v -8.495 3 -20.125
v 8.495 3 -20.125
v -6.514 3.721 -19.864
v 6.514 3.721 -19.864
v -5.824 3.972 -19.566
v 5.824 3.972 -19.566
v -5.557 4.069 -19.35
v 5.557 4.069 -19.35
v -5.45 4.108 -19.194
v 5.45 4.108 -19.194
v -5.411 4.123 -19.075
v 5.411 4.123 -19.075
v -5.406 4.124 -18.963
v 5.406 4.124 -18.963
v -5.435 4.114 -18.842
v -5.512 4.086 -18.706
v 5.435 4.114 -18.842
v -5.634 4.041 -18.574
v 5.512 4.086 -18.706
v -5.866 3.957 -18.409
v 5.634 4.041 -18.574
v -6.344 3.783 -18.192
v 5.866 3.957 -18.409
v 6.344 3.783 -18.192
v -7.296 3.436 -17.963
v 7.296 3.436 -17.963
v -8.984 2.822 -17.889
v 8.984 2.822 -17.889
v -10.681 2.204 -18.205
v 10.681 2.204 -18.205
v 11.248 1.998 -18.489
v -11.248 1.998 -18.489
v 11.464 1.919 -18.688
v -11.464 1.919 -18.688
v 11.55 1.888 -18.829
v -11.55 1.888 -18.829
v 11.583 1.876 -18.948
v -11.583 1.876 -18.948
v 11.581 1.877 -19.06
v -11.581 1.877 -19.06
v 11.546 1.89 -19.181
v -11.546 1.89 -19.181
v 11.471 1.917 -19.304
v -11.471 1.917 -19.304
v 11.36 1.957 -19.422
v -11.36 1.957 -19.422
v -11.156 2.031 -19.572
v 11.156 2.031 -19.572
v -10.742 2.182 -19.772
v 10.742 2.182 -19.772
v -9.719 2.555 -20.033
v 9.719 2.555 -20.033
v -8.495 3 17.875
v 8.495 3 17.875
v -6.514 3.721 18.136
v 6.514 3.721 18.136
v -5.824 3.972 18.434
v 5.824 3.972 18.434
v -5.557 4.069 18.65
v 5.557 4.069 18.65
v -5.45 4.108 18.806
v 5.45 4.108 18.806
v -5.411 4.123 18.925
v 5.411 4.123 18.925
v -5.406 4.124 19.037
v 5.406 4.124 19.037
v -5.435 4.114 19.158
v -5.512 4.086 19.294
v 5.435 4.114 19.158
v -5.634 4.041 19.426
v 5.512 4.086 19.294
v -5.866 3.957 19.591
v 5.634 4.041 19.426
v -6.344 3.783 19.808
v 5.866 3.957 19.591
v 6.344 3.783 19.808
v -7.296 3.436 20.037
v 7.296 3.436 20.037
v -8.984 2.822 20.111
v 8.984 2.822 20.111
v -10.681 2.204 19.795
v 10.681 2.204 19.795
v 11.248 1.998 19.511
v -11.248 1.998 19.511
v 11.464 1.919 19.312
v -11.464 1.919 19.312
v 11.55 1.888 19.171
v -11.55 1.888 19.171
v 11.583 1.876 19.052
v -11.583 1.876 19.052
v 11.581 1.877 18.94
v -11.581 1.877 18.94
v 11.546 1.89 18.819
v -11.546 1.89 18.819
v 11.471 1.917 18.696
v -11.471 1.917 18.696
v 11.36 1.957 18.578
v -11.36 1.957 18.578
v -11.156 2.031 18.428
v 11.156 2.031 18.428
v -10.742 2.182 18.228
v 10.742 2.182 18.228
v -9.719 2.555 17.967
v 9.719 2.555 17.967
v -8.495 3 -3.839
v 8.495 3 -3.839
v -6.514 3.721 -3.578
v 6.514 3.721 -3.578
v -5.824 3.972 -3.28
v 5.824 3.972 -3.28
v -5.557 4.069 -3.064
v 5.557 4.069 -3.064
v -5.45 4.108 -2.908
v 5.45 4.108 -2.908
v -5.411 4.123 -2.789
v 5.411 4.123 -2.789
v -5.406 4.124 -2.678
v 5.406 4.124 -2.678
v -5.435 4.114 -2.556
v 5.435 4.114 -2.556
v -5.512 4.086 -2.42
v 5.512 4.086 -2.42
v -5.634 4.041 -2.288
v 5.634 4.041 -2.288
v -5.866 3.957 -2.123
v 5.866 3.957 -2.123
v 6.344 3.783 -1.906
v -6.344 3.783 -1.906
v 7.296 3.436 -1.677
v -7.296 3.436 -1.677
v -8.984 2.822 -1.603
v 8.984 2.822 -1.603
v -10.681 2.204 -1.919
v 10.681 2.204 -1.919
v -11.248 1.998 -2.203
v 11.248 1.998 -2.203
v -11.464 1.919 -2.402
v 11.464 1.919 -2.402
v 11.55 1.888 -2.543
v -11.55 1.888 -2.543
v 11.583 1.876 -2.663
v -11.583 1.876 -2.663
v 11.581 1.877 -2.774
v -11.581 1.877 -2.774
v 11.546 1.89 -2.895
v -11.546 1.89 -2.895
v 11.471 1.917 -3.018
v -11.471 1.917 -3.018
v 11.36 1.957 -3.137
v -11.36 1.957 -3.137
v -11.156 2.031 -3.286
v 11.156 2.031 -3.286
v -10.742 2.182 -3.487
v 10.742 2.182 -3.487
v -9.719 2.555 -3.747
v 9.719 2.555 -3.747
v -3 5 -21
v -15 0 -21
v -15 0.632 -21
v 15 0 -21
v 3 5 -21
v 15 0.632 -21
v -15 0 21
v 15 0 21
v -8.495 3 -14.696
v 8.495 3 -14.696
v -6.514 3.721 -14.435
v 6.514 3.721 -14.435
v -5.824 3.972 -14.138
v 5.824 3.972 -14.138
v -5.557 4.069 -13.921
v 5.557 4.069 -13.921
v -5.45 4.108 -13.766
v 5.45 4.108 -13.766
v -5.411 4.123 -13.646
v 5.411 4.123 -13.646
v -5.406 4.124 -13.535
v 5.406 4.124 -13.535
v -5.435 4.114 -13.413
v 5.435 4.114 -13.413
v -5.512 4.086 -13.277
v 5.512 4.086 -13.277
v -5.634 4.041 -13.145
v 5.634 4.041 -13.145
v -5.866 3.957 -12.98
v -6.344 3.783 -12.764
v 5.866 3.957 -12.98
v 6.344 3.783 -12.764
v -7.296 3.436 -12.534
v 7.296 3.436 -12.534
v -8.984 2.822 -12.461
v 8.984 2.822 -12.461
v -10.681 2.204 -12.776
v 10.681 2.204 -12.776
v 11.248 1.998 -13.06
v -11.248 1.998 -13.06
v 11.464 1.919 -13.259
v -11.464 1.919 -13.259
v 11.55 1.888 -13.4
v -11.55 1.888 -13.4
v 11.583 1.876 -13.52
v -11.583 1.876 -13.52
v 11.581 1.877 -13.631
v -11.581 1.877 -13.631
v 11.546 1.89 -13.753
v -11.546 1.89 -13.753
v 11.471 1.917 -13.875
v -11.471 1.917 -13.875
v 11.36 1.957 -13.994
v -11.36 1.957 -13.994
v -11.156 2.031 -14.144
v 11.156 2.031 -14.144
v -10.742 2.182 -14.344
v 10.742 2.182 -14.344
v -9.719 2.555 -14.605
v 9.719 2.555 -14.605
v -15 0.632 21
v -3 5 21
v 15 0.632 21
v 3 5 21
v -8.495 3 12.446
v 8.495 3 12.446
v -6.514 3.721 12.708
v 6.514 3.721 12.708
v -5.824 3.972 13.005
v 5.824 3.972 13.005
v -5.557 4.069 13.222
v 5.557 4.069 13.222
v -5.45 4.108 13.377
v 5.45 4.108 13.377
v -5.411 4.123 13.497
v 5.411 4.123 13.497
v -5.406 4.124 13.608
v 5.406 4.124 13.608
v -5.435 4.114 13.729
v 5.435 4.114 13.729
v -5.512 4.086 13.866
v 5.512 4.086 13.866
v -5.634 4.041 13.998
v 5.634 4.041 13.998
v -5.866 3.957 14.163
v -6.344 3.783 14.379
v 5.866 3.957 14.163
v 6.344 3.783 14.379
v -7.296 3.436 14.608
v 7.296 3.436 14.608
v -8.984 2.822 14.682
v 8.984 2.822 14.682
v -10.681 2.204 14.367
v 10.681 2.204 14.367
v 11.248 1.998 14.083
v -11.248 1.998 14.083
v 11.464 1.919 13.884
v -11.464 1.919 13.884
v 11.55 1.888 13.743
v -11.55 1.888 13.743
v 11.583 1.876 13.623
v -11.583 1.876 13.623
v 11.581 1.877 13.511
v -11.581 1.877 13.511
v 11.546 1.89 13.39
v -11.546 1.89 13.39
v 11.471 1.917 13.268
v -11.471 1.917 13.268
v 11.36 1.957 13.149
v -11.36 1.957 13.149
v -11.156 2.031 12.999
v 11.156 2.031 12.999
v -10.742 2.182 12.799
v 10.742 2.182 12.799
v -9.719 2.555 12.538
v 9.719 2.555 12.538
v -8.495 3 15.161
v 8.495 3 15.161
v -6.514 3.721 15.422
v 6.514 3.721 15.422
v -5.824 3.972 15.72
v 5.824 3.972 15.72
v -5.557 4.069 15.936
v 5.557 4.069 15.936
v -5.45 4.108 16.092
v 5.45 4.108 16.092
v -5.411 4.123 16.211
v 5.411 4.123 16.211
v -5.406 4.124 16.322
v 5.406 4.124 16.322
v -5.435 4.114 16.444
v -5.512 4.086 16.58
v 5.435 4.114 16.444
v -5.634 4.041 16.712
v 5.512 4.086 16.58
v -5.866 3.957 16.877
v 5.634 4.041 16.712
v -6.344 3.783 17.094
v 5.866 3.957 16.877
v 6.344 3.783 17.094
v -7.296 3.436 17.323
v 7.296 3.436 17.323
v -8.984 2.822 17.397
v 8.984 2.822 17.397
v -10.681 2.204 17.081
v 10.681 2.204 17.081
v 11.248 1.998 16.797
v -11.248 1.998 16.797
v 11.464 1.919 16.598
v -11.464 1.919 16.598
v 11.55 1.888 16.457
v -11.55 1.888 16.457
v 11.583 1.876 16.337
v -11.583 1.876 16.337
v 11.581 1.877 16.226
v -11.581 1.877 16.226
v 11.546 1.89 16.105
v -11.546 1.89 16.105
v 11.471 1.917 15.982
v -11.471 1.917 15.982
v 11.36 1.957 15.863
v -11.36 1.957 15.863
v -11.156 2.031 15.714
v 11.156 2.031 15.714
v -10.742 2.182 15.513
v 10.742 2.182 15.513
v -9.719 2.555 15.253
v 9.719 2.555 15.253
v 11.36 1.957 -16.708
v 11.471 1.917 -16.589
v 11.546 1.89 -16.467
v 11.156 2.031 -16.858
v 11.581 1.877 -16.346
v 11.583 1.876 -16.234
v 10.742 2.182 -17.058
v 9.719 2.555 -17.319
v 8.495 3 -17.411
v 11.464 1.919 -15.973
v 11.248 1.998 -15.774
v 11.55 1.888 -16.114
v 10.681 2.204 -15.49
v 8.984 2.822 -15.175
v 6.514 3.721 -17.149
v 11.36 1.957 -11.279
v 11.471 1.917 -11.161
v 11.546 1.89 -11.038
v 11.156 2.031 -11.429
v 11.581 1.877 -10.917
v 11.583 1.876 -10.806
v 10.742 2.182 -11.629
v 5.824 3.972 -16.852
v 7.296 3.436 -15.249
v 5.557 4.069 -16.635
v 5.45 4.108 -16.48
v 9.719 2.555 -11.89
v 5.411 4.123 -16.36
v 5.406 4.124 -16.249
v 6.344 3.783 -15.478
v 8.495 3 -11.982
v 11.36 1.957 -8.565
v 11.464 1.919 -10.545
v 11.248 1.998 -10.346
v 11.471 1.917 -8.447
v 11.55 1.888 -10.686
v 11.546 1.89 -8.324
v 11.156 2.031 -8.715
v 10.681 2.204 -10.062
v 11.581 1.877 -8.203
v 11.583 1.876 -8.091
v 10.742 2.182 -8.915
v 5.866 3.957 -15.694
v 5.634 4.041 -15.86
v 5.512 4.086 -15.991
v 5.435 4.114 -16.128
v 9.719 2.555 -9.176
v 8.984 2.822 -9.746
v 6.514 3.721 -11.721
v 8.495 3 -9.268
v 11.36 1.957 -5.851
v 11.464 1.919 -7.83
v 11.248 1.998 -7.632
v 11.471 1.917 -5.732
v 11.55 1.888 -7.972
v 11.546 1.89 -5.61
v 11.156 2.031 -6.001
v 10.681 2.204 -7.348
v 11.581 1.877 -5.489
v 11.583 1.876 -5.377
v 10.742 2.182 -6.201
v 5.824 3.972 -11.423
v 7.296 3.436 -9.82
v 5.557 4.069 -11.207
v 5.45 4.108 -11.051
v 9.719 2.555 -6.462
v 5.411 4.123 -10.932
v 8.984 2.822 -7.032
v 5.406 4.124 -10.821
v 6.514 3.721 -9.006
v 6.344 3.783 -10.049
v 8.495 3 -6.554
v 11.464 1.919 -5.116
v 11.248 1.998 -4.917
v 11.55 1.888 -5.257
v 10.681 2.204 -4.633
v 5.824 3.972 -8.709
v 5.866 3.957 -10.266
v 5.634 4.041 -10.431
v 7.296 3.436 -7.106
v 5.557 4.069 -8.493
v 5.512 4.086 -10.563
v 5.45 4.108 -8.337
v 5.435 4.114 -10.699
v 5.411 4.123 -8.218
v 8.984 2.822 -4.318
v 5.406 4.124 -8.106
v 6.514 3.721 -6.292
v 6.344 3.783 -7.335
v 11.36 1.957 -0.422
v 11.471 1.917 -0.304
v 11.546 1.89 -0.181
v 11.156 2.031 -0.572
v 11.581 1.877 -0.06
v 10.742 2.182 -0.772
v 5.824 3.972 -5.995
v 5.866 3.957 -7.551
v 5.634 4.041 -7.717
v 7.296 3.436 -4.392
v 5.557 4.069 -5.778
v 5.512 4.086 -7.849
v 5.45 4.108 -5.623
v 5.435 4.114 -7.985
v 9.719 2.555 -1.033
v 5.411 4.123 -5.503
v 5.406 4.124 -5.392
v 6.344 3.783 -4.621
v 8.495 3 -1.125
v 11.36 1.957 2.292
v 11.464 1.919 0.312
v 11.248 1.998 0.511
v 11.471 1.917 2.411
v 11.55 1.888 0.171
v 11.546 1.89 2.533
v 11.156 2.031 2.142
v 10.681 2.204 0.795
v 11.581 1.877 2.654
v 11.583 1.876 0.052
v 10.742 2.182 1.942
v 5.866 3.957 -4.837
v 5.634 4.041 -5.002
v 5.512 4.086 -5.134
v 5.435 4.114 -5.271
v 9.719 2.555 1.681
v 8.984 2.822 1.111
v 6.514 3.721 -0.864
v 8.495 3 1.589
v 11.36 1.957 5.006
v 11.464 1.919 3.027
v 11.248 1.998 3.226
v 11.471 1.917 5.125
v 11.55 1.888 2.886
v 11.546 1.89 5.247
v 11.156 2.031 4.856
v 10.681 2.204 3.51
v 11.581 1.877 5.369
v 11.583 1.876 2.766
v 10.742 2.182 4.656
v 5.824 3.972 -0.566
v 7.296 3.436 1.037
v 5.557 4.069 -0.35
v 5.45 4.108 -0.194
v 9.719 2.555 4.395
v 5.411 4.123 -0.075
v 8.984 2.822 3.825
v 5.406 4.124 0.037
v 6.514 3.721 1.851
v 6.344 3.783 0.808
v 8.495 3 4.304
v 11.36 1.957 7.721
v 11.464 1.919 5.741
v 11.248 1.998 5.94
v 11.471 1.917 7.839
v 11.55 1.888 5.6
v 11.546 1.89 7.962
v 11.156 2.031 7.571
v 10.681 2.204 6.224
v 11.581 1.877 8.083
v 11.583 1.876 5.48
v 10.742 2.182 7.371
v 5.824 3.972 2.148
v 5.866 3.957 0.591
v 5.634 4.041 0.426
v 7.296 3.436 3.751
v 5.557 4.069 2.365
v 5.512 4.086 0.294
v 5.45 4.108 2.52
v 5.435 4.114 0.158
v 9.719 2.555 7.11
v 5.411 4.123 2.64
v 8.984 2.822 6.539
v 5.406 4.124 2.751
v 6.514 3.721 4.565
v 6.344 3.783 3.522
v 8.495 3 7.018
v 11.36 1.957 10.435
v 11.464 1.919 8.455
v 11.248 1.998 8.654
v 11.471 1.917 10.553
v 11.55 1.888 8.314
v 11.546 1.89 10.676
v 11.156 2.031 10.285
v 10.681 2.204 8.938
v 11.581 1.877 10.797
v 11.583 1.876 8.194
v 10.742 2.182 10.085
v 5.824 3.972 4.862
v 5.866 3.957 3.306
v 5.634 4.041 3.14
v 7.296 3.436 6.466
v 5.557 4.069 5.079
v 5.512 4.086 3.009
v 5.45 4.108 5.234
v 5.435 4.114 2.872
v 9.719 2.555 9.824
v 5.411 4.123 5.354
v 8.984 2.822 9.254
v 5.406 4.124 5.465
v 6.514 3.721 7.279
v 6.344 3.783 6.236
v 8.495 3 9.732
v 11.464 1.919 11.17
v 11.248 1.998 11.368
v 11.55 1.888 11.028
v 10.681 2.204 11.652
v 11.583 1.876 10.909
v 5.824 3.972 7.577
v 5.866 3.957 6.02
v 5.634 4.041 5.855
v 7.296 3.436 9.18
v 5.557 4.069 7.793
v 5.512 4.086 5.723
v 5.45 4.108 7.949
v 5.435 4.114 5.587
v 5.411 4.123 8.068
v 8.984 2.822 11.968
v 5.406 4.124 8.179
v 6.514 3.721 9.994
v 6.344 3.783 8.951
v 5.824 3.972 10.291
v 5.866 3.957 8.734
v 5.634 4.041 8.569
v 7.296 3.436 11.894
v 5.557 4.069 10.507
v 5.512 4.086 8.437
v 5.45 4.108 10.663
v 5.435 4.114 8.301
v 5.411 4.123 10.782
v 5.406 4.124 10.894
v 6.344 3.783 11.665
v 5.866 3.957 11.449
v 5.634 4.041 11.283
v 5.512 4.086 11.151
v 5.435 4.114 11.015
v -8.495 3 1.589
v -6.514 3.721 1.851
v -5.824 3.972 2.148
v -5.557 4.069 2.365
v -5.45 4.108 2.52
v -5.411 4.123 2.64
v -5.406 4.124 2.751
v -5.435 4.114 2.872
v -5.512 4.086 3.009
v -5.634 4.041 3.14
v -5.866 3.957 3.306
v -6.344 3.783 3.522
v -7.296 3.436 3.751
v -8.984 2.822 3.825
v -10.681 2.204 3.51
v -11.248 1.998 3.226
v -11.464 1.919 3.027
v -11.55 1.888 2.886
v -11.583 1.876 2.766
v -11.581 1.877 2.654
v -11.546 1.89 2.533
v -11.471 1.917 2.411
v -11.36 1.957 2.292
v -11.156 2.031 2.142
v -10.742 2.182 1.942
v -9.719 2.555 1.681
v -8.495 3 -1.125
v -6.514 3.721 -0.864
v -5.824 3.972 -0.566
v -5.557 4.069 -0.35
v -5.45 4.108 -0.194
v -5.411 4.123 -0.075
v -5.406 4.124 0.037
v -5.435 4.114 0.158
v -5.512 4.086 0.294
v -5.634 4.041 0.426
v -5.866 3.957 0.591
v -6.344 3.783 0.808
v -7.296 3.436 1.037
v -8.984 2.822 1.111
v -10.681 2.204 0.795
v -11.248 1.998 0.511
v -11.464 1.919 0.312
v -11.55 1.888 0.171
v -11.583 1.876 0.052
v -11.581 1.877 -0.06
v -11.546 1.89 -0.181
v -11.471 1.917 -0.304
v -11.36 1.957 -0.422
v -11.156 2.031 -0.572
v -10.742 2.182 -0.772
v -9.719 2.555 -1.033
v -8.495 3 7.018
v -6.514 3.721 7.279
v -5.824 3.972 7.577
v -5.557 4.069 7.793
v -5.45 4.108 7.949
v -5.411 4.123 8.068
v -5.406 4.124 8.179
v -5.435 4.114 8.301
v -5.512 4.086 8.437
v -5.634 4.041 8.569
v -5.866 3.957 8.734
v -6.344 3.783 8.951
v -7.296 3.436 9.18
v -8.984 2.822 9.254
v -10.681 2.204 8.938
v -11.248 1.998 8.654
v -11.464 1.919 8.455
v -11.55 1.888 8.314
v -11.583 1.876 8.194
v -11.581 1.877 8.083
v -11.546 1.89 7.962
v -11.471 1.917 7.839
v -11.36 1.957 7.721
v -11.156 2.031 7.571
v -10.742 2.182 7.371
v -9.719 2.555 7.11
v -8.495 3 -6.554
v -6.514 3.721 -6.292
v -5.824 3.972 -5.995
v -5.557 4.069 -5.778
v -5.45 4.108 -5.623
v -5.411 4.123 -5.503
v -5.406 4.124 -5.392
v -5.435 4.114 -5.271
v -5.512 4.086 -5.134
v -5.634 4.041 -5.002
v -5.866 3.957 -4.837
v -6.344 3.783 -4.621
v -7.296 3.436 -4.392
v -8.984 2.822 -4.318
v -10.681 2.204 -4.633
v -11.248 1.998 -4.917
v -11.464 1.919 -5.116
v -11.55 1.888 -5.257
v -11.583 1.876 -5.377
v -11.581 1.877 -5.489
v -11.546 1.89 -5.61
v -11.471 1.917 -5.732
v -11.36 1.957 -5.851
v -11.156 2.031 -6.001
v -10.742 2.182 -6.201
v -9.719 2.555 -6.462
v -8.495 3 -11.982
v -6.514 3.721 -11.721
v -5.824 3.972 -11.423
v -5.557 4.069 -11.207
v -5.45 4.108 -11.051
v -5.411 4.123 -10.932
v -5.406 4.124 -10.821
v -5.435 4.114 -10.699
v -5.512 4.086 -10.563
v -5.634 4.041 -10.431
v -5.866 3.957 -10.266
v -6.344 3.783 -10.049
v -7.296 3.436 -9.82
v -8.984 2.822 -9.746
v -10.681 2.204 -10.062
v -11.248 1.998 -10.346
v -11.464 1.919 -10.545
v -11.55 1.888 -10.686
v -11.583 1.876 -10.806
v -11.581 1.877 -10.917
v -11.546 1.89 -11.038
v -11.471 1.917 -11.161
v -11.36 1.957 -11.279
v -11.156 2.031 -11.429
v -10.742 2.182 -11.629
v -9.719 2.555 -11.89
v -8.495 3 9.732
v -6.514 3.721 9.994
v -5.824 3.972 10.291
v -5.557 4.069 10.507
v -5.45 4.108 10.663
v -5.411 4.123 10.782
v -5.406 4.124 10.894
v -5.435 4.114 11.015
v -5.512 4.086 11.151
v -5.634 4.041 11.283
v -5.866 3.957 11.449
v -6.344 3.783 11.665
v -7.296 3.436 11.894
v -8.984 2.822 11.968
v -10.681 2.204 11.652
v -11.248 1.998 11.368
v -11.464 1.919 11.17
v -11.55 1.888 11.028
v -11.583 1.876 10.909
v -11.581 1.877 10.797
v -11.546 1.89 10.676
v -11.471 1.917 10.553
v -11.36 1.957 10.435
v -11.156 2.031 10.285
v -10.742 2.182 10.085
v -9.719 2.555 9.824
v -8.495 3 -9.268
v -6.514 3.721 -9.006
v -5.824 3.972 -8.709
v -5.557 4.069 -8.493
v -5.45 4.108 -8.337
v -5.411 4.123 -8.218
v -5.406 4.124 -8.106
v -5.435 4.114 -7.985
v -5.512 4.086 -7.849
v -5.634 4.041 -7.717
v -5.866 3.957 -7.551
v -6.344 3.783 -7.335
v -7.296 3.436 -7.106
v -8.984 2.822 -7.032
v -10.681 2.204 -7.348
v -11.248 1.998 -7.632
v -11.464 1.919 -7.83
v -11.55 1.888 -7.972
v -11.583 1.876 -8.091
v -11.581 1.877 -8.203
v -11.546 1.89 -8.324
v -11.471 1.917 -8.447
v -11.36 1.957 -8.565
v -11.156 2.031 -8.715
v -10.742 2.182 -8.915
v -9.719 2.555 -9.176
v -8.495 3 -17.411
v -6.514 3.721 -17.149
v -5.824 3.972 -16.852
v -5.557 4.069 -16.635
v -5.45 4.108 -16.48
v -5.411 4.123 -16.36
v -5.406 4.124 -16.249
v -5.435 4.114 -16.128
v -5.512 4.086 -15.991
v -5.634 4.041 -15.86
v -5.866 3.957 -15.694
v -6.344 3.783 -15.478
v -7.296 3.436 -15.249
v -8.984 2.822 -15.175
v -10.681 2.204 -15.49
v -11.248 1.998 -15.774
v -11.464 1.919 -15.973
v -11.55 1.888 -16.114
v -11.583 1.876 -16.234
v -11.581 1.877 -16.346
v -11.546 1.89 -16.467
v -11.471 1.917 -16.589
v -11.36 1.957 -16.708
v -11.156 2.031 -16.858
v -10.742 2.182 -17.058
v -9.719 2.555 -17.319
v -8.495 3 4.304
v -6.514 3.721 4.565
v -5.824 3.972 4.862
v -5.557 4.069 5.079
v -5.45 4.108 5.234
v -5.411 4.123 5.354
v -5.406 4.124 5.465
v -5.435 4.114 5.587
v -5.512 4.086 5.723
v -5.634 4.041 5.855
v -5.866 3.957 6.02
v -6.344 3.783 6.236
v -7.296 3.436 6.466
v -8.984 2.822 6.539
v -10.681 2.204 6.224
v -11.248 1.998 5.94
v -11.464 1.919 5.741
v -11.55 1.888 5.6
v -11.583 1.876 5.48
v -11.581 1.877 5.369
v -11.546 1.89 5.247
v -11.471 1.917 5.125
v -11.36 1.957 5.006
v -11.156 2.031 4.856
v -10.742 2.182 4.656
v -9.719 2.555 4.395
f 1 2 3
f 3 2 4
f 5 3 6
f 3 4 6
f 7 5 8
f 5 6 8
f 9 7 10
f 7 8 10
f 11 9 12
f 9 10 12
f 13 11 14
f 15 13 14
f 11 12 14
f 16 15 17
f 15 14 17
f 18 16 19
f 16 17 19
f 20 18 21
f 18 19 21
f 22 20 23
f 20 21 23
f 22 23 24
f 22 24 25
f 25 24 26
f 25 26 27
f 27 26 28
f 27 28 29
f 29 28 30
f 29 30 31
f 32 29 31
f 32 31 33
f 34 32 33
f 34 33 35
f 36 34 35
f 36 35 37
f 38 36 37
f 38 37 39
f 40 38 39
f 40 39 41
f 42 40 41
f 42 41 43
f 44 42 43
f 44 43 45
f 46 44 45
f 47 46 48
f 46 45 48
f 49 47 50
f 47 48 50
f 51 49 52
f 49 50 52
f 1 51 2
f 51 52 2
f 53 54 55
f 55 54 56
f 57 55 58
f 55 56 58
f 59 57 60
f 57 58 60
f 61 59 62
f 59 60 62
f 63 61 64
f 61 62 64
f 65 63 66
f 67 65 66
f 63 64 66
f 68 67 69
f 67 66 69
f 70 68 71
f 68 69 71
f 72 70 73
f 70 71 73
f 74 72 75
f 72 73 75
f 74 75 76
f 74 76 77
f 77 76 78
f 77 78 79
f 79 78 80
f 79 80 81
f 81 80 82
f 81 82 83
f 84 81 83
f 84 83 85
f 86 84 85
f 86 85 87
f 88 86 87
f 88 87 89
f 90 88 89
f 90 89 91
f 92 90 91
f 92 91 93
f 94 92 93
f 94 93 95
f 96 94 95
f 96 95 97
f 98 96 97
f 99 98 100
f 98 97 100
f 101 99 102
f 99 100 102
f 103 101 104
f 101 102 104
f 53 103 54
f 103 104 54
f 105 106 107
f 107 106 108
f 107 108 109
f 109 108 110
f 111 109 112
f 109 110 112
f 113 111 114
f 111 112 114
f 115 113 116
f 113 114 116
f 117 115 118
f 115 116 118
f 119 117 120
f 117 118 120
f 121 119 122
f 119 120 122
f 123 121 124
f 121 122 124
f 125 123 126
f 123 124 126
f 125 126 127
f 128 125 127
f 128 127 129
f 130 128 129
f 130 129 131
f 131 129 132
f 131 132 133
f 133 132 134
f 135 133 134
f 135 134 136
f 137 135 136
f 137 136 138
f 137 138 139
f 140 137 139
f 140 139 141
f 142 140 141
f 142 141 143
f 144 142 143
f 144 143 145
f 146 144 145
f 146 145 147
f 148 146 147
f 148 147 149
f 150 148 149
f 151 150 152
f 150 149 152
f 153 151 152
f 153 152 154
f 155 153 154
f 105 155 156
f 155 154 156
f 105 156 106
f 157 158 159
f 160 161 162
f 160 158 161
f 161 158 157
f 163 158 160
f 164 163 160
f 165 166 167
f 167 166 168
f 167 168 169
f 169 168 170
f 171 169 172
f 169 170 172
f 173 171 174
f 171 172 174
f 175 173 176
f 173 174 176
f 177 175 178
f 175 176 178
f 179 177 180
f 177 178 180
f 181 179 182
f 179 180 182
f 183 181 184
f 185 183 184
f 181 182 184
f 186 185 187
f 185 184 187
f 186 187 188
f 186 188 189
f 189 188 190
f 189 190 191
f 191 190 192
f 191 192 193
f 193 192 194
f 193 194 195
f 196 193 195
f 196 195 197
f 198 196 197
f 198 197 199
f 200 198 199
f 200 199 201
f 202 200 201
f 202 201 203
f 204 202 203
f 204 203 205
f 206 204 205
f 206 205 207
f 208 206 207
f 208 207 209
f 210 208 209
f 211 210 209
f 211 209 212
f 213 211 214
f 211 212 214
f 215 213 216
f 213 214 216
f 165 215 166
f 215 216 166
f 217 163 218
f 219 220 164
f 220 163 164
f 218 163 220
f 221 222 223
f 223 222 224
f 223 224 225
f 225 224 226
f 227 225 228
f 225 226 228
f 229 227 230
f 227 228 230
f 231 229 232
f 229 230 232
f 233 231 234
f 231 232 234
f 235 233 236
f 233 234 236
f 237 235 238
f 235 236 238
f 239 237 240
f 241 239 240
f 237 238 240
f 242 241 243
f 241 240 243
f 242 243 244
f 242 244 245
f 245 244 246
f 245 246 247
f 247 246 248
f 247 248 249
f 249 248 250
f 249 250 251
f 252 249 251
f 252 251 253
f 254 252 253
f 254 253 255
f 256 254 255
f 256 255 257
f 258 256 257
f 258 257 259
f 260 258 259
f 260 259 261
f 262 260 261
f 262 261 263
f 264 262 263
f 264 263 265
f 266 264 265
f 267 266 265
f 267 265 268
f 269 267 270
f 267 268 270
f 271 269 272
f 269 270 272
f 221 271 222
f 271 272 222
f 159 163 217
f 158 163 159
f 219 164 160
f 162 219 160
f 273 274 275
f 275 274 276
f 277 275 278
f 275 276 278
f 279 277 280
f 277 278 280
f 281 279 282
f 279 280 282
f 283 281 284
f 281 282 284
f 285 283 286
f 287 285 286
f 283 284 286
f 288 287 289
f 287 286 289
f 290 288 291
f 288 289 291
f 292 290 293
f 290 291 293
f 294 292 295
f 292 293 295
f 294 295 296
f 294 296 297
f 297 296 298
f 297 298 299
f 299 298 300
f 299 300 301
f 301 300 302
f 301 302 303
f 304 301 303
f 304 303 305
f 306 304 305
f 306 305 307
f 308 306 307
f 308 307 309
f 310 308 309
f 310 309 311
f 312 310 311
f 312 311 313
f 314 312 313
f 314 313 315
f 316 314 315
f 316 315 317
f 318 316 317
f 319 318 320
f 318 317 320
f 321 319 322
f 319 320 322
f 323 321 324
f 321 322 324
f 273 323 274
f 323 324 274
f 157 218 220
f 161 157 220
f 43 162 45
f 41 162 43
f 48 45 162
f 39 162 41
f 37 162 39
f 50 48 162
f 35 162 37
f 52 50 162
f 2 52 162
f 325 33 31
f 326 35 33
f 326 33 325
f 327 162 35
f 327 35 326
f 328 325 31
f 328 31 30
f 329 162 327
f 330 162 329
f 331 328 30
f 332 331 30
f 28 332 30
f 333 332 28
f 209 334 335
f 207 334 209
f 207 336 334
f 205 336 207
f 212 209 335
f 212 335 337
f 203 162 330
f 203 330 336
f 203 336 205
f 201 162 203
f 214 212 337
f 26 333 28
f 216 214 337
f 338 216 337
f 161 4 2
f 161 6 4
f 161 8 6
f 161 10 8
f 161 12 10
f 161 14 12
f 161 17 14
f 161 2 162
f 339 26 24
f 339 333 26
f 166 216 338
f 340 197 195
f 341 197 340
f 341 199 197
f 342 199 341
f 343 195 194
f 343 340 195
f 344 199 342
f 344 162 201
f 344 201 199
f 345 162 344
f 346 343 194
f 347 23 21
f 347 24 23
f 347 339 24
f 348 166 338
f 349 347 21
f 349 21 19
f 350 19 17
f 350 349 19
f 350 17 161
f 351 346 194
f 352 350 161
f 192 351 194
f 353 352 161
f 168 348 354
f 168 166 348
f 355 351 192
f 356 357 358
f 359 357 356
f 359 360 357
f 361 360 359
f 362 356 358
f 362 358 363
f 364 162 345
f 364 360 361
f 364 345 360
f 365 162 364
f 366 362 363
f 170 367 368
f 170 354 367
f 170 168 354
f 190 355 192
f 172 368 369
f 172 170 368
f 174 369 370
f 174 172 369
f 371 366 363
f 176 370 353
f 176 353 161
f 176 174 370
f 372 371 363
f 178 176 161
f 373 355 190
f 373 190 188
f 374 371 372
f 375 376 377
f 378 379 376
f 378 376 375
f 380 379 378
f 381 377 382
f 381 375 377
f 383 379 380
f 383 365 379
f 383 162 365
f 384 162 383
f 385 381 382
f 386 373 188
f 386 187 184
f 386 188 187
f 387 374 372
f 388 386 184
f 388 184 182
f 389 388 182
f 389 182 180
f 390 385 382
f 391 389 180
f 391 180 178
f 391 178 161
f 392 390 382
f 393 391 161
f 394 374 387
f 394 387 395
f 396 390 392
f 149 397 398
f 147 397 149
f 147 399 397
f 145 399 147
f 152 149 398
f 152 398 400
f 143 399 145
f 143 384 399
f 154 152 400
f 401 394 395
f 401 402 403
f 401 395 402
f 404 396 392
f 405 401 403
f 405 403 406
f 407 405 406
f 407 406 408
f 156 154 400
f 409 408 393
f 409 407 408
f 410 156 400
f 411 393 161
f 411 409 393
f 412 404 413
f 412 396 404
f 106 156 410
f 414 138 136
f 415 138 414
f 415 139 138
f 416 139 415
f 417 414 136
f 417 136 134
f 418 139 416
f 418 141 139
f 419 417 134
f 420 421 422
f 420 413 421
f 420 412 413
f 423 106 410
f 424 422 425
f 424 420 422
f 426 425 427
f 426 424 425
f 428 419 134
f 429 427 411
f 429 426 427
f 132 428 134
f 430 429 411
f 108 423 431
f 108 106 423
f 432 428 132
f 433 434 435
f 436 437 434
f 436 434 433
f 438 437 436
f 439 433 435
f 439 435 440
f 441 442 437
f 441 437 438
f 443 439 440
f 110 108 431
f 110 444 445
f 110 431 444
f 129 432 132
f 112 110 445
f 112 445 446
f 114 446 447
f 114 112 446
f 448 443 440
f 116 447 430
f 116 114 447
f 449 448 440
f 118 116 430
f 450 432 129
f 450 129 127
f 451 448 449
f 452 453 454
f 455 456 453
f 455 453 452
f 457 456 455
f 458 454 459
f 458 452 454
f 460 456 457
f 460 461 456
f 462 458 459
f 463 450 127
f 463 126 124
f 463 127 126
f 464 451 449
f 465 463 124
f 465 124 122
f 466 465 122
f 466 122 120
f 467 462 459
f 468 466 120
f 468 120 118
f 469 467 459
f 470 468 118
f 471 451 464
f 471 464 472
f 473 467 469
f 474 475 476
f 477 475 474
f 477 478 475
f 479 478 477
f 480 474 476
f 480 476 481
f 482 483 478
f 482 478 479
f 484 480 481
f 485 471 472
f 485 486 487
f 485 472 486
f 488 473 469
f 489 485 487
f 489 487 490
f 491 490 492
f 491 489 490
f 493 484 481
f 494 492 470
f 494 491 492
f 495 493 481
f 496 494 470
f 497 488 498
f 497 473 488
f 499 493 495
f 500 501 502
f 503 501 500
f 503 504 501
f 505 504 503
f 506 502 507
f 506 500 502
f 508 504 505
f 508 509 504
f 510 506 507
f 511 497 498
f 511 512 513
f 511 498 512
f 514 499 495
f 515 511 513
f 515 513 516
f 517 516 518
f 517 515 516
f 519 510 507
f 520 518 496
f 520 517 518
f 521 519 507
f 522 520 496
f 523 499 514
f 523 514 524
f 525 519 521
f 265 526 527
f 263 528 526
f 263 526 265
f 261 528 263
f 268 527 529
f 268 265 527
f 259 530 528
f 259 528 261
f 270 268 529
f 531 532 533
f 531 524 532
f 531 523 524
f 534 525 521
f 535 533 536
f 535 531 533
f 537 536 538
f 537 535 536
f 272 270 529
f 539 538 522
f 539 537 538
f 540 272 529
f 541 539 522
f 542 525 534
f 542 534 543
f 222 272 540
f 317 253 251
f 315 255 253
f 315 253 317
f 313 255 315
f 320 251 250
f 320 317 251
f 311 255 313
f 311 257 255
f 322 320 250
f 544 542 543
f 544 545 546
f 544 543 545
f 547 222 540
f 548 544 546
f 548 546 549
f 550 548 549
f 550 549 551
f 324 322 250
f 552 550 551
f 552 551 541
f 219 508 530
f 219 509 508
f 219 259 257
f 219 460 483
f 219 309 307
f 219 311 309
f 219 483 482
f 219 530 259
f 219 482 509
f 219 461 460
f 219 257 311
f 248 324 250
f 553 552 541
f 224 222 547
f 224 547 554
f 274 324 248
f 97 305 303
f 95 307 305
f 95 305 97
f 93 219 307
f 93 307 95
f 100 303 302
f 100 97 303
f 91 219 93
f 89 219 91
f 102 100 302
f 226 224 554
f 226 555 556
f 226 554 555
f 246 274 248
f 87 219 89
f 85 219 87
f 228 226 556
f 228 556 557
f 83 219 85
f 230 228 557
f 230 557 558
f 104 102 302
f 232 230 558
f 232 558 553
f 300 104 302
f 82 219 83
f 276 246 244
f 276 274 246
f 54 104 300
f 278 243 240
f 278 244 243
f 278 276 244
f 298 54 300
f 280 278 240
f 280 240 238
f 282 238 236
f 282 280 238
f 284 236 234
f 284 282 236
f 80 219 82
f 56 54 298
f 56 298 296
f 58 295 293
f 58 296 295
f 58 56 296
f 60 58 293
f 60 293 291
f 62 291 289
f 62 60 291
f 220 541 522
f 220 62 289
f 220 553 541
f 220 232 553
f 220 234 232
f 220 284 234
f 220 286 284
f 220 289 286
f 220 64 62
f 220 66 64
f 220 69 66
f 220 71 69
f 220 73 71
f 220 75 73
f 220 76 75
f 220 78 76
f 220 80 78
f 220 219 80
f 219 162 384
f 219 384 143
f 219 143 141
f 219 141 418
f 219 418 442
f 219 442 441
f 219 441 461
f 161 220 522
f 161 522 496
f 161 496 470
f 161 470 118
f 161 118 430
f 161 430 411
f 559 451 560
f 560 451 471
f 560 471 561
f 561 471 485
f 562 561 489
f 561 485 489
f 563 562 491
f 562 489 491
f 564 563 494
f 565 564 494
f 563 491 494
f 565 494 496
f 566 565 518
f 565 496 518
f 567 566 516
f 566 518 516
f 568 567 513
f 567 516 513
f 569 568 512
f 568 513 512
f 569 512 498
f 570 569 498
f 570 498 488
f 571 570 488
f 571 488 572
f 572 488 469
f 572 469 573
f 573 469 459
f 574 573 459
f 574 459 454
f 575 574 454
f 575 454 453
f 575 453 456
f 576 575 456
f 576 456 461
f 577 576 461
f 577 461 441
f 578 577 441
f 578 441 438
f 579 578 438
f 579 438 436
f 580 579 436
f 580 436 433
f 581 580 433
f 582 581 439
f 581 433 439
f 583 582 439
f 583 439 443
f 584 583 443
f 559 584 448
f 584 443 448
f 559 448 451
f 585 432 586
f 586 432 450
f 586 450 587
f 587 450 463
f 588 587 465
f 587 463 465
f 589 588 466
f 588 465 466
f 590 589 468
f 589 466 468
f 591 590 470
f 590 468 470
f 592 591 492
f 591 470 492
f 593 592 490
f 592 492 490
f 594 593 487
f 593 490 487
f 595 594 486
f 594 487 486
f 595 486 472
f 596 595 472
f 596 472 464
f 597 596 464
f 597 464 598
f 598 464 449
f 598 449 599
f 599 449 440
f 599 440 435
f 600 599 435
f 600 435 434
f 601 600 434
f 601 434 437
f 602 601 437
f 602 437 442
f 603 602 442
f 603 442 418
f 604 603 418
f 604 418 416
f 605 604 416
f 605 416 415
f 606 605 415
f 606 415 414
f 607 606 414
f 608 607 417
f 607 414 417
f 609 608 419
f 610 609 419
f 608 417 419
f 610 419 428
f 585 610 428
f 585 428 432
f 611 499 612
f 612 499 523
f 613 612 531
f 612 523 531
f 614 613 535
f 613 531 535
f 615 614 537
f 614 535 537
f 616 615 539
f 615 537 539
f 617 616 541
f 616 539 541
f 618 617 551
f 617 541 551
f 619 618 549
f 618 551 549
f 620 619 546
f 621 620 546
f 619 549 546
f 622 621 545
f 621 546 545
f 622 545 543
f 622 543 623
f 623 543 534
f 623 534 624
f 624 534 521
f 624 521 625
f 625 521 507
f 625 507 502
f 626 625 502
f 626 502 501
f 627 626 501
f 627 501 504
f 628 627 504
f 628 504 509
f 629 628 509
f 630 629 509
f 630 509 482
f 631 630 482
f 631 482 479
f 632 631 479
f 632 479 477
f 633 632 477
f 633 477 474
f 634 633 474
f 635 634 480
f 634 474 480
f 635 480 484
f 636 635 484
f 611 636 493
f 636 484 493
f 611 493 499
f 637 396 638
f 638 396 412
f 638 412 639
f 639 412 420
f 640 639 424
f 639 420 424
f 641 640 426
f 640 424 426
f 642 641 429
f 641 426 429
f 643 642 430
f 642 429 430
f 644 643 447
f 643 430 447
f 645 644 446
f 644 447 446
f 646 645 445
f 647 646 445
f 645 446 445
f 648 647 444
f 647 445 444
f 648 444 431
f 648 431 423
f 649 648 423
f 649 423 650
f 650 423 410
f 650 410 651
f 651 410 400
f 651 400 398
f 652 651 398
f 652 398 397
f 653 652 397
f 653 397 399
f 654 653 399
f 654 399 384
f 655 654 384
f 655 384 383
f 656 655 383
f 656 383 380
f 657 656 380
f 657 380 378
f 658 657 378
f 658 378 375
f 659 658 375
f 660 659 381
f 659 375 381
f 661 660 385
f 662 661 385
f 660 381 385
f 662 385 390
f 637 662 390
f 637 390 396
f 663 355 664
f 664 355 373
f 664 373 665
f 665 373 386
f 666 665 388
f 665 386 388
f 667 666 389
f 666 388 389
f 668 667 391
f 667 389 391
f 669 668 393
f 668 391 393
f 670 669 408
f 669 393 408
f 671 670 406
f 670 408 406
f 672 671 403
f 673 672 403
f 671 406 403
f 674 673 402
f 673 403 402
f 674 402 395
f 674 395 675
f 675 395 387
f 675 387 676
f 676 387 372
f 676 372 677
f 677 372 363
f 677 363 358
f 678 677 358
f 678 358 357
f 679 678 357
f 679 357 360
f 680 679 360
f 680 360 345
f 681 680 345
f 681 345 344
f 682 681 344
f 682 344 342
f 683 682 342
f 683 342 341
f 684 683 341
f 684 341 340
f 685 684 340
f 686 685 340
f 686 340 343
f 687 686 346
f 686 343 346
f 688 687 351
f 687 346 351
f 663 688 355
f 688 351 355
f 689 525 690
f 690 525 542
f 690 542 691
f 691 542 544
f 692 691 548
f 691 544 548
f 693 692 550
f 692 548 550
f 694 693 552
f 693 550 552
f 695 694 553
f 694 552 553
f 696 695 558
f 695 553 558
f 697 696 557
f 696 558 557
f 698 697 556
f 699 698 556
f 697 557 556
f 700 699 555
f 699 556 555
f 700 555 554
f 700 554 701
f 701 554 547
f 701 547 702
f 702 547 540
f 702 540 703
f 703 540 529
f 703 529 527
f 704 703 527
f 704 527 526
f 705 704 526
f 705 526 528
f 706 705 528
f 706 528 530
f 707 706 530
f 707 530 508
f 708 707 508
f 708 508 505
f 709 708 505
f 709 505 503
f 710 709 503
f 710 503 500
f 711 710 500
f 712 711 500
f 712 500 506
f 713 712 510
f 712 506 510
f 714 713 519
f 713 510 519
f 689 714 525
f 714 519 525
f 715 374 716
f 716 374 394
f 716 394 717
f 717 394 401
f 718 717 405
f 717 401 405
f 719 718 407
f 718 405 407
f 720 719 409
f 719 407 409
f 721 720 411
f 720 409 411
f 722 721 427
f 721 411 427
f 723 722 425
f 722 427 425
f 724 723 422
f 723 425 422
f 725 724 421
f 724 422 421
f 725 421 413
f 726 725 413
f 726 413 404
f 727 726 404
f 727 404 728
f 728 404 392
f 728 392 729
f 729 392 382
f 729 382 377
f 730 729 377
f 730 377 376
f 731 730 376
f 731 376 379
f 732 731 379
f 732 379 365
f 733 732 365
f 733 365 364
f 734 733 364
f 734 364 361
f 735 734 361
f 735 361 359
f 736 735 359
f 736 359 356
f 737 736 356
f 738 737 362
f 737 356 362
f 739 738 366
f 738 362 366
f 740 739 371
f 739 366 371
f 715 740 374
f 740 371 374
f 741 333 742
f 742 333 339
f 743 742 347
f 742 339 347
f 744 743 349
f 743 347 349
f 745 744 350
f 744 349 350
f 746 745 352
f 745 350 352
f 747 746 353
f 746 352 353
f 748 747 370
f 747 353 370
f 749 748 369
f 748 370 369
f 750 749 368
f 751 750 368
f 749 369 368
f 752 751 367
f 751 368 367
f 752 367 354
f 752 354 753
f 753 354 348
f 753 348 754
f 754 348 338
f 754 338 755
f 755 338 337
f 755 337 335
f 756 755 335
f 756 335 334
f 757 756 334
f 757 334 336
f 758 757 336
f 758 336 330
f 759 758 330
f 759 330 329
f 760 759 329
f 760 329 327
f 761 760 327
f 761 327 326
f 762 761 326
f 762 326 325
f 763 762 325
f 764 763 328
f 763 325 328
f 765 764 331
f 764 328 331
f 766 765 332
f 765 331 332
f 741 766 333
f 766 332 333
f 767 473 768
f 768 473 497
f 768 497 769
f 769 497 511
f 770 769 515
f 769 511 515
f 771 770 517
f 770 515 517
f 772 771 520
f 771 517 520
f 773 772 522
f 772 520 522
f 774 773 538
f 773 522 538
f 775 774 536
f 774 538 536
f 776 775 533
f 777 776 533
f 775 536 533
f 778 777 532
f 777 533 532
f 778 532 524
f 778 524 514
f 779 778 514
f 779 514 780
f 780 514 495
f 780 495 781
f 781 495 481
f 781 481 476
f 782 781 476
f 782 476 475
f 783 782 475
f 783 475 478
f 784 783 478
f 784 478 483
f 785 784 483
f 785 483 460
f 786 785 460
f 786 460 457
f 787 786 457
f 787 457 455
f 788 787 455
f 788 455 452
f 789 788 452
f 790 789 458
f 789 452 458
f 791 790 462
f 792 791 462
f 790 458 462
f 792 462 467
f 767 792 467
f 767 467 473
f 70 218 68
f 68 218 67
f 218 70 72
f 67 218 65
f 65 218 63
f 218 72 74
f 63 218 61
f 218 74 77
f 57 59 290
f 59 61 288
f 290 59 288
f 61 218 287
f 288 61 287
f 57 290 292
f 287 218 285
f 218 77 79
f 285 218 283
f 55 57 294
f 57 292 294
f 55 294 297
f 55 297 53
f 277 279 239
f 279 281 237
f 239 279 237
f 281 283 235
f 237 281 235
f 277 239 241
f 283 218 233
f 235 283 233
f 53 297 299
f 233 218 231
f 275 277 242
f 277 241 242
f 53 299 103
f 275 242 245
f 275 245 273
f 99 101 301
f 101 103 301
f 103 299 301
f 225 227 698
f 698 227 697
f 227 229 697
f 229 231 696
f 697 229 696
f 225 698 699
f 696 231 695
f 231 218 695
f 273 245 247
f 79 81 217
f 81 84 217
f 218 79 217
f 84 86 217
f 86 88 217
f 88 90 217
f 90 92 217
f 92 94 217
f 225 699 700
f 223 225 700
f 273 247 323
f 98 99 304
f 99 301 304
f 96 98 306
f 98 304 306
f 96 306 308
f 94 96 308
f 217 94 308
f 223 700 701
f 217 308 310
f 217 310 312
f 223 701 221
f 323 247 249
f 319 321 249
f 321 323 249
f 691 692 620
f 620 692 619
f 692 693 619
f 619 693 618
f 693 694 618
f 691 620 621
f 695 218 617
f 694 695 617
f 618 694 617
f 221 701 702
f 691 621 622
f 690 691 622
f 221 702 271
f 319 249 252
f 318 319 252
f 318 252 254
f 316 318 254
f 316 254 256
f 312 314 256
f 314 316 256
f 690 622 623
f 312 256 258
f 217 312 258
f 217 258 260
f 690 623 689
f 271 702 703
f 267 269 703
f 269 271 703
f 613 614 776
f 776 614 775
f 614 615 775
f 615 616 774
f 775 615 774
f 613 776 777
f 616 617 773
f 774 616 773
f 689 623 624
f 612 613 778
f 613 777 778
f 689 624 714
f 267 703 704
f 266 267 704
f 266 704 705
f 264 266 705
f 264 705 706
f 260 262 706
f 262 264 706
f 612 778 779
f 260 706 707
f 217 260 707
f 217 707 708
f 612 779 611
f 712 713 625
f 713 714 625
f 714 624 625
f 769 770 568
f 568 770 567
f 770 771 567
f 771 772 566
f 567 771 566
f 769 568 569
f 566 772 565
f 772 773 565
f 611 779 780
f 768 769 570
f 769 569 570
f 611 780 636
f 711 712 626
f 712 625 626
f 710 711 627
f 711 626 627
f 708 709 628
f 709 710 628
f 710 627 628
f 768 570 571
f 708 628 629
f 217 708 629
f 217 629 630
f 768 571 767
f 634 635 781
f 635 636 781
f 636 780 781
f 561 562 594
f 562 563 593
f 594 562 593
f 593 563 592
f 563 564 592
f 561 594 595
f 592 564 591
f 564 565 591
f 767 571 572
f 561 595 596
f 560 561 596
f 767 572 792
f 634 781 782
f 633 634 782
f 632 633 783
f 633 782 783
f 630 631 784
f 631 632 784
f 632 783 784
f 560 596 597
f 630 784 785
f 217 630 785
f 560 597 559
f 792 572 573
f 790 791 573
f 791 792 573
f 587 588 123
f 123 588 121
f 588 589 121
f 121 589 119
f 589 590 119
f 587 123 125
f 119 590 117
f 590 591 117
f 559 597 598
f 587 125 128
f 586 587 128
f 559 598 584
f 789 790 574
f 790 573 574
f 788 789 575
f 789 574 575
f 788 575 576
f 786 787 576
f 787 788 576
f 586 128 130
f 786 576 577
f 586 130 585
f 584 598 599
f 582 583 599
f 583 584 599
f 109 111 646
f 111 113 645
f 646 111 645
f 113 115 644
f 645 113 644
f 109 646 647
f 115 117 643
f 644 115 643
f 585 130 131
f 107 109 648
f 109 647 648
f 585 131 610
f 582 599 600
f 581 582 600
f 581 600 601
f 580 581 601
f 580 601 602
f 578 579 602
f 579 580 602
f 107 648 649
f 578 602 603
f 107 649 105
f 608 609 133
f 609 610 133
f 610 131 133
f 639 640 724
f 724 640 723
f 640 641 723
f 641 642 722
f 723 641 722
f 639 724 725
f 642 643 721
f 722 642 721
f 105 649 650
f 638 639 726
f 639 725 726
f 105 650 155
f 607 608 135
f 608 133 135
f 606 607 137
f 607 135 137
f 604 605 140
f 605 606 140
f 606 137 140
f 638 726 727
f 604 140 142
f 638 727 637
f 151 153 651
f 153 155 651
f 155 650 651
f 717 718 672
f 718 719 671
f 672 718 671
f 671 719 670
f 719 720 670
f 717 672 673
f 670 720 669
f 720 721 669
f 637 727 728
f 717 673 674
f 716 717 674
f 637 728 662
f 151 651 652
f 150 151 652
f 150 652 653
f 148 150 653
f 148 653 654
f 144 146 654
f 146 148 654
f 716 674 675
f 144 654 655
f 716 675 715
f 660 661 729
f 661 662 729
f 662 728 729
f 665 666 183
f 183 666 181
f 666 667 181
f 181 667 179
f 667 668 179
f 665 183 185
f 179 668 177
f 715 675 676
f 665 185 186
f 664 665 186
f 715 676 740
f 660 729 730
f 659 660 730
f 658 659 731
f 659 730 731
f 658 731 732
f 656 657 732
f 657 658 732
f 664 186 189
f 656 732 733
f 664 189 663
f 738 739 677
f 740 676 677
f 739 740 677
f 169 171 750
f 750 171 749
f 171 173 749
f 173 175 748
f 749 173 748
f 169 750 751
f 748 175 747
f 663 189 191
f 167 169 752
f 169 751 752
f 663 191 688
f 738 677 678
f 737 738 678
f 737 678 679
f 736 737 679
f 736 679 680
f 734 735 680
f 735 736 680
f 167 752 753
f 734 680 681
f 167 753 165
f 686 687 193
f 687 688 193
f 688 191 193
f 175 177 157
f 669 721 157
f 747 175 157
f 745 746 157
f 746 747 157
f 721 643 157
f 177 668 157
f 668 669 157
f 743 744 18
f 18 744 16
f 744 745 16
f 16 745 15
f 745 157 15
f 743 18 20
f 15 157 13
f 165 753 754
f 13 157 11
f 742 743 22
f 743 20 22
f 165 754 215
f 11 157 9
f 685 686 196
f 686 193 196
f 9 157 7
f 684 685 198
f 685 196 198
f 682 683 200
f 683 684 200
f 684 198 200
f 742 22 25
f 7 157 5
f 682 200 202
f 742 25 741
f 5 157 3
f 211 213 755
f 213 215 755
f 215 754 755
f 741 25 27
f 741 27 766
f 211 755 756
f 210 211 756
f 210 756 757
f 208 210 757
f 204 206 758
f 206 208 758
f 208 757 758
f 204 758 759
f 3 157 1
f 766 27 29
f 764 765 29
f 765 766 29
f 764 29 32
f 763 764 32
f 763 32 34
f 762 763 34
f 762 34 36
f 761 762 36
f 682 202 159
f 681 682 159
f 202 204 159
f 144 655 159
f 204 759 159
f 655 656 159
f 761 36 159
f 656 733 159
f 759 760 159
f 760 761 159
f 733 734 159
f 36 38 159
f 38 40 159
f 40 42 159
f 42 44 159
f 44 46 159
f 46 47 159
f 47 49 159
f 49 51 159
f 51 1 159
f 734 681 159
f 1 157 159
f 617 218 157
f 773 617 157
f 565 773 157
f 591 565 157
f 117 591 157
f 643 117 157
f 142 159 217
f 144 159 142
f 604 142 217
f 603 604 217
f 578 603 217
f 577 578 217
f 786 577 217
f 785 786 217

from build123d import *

# Parameters (mm, degrees)
SKETCH1_W           = 30
SKETCH1_H           = 42
BOSS_EXTRUDE1_DEPTH = 5
SKETCH2_R           = 1.125
CUT_EXTRUDE1_DEPTH  = 37.959437225
CHAMFER1_SIZE       = 4.367642811
CHAMFER1_SIZE_2     = 12
CHAMFER2_SIZE       = 12
CHAMFER2_SIZE_2     = 4.367642811


with BuildPart() as part:
    # Sketch1 → Boss-Extrude1 (new body)
    with BuildSketch(Plane(origin=(0, 0, 0), x_dir=(1, 0, 0), z_dir=(0, 1, 0))):
        Rectangle(SKETCH1_W, SKETCH1_H)
    extrude(amount=BOSS_EXTRUDE1_DEPTH)

    # Sketch2 → Cut-Extrude1 (cut, through all)
    with BuildSketch(Plane(origin=(15, 0, 0), x_dir=(0, 0, -1), z_dir=(1, 0, 0))):
        with Locations((-19, 3)):
            Circle(SKETCH2_R)
        with Locations((-16.285714286, 3)):
            Circle(SKETCH2_R)
        with Locations((-13.571428571, 3)):
            Circle(SKETCH2_R)
        with Locations((-10.857142857, 3)):
            Circle(SKETCH2_R)
        with Locations((-8.142857143, 3)):
            Circle(SKETCH2_R)
        with Locations((-5.428571429, 3)):
            Circle(SKETCH2_R)
        with Locations((-2.714285714, 3)):
            Circle(SKETCH2_R)
        with Locations((0, 3)):
            Circle(SKETCH2_R)
        with Locations((2.714285714, 3)):
            Circle(SKETCH2_R)
        with Locations((5.428571429, 3)):
            Circle(SKETCH2_R)
        with Locations((8.142857143, 3)):
            Circle(SKETCH2_R)
        with Locations((10.857142857, 3)):
            Circle(SKETCH2_R)
        with Locations((13.571428571, 3)):
            Circle(SKETCH2_R)
        with Locations((16.285714286, 3)):
            Circle(SKETCH2_R)
        with Locations((19, 3)):
            Circle(SKETCH2_R)
    extrude(amount=-CUT_EXTRUDE1_DEPTH, mode=Mode.SUBTRACT)

    # Chamfer1
    # the kernel refuses this chamfer: 12, 4.367642811 mm, written as the material it takes off along each edge
    with BuildSketch(Plane(origin=(15, 5, 52.130336791), x_dir=(0.09904090225204926, -0.9950833631817486, 0), z_dir=(0, 0, -1))) as chamfer1_piece_1:
        Polygon((CHAMFER1_SIZE * 0.995083363226, CHAMFER1_SIZE * 0.0990409022565), (-CHAMFER1_SIZE_2 * 0.099040902252, CHAMFER1_SIZE_2 * 0.995083363182), (0, 0), align=None)
    extrude(amount=104.260673581, mode=Mode.SUBTRACT)

    # Chamfer2
    # the kernel refuses this chamfer: 12, 4.367642811 mm, written as the material it takes off along each edge
    with BuildSketch(Plane(origin=(-15, 5, -52.130336791), x_dir=(0.9999130865277315, 0.013184058198645937, 0), z_dir=(0, 0, 1))) as chamfer2_piece_1:
        Polygon((CHAMFER2_SIZE * 0.999913086528, -CHAMFER2_SIZE * 0.0131840581986), (-CHAMFER2_SIZE_2 * 0.0131840581992, -CHAMFER2_SIZE_2 * 0.999913086572), (0, 0), align=None)
    extrude(amount=104.260673581, mode=Mode.SUBTRACT)


solid = part.part
